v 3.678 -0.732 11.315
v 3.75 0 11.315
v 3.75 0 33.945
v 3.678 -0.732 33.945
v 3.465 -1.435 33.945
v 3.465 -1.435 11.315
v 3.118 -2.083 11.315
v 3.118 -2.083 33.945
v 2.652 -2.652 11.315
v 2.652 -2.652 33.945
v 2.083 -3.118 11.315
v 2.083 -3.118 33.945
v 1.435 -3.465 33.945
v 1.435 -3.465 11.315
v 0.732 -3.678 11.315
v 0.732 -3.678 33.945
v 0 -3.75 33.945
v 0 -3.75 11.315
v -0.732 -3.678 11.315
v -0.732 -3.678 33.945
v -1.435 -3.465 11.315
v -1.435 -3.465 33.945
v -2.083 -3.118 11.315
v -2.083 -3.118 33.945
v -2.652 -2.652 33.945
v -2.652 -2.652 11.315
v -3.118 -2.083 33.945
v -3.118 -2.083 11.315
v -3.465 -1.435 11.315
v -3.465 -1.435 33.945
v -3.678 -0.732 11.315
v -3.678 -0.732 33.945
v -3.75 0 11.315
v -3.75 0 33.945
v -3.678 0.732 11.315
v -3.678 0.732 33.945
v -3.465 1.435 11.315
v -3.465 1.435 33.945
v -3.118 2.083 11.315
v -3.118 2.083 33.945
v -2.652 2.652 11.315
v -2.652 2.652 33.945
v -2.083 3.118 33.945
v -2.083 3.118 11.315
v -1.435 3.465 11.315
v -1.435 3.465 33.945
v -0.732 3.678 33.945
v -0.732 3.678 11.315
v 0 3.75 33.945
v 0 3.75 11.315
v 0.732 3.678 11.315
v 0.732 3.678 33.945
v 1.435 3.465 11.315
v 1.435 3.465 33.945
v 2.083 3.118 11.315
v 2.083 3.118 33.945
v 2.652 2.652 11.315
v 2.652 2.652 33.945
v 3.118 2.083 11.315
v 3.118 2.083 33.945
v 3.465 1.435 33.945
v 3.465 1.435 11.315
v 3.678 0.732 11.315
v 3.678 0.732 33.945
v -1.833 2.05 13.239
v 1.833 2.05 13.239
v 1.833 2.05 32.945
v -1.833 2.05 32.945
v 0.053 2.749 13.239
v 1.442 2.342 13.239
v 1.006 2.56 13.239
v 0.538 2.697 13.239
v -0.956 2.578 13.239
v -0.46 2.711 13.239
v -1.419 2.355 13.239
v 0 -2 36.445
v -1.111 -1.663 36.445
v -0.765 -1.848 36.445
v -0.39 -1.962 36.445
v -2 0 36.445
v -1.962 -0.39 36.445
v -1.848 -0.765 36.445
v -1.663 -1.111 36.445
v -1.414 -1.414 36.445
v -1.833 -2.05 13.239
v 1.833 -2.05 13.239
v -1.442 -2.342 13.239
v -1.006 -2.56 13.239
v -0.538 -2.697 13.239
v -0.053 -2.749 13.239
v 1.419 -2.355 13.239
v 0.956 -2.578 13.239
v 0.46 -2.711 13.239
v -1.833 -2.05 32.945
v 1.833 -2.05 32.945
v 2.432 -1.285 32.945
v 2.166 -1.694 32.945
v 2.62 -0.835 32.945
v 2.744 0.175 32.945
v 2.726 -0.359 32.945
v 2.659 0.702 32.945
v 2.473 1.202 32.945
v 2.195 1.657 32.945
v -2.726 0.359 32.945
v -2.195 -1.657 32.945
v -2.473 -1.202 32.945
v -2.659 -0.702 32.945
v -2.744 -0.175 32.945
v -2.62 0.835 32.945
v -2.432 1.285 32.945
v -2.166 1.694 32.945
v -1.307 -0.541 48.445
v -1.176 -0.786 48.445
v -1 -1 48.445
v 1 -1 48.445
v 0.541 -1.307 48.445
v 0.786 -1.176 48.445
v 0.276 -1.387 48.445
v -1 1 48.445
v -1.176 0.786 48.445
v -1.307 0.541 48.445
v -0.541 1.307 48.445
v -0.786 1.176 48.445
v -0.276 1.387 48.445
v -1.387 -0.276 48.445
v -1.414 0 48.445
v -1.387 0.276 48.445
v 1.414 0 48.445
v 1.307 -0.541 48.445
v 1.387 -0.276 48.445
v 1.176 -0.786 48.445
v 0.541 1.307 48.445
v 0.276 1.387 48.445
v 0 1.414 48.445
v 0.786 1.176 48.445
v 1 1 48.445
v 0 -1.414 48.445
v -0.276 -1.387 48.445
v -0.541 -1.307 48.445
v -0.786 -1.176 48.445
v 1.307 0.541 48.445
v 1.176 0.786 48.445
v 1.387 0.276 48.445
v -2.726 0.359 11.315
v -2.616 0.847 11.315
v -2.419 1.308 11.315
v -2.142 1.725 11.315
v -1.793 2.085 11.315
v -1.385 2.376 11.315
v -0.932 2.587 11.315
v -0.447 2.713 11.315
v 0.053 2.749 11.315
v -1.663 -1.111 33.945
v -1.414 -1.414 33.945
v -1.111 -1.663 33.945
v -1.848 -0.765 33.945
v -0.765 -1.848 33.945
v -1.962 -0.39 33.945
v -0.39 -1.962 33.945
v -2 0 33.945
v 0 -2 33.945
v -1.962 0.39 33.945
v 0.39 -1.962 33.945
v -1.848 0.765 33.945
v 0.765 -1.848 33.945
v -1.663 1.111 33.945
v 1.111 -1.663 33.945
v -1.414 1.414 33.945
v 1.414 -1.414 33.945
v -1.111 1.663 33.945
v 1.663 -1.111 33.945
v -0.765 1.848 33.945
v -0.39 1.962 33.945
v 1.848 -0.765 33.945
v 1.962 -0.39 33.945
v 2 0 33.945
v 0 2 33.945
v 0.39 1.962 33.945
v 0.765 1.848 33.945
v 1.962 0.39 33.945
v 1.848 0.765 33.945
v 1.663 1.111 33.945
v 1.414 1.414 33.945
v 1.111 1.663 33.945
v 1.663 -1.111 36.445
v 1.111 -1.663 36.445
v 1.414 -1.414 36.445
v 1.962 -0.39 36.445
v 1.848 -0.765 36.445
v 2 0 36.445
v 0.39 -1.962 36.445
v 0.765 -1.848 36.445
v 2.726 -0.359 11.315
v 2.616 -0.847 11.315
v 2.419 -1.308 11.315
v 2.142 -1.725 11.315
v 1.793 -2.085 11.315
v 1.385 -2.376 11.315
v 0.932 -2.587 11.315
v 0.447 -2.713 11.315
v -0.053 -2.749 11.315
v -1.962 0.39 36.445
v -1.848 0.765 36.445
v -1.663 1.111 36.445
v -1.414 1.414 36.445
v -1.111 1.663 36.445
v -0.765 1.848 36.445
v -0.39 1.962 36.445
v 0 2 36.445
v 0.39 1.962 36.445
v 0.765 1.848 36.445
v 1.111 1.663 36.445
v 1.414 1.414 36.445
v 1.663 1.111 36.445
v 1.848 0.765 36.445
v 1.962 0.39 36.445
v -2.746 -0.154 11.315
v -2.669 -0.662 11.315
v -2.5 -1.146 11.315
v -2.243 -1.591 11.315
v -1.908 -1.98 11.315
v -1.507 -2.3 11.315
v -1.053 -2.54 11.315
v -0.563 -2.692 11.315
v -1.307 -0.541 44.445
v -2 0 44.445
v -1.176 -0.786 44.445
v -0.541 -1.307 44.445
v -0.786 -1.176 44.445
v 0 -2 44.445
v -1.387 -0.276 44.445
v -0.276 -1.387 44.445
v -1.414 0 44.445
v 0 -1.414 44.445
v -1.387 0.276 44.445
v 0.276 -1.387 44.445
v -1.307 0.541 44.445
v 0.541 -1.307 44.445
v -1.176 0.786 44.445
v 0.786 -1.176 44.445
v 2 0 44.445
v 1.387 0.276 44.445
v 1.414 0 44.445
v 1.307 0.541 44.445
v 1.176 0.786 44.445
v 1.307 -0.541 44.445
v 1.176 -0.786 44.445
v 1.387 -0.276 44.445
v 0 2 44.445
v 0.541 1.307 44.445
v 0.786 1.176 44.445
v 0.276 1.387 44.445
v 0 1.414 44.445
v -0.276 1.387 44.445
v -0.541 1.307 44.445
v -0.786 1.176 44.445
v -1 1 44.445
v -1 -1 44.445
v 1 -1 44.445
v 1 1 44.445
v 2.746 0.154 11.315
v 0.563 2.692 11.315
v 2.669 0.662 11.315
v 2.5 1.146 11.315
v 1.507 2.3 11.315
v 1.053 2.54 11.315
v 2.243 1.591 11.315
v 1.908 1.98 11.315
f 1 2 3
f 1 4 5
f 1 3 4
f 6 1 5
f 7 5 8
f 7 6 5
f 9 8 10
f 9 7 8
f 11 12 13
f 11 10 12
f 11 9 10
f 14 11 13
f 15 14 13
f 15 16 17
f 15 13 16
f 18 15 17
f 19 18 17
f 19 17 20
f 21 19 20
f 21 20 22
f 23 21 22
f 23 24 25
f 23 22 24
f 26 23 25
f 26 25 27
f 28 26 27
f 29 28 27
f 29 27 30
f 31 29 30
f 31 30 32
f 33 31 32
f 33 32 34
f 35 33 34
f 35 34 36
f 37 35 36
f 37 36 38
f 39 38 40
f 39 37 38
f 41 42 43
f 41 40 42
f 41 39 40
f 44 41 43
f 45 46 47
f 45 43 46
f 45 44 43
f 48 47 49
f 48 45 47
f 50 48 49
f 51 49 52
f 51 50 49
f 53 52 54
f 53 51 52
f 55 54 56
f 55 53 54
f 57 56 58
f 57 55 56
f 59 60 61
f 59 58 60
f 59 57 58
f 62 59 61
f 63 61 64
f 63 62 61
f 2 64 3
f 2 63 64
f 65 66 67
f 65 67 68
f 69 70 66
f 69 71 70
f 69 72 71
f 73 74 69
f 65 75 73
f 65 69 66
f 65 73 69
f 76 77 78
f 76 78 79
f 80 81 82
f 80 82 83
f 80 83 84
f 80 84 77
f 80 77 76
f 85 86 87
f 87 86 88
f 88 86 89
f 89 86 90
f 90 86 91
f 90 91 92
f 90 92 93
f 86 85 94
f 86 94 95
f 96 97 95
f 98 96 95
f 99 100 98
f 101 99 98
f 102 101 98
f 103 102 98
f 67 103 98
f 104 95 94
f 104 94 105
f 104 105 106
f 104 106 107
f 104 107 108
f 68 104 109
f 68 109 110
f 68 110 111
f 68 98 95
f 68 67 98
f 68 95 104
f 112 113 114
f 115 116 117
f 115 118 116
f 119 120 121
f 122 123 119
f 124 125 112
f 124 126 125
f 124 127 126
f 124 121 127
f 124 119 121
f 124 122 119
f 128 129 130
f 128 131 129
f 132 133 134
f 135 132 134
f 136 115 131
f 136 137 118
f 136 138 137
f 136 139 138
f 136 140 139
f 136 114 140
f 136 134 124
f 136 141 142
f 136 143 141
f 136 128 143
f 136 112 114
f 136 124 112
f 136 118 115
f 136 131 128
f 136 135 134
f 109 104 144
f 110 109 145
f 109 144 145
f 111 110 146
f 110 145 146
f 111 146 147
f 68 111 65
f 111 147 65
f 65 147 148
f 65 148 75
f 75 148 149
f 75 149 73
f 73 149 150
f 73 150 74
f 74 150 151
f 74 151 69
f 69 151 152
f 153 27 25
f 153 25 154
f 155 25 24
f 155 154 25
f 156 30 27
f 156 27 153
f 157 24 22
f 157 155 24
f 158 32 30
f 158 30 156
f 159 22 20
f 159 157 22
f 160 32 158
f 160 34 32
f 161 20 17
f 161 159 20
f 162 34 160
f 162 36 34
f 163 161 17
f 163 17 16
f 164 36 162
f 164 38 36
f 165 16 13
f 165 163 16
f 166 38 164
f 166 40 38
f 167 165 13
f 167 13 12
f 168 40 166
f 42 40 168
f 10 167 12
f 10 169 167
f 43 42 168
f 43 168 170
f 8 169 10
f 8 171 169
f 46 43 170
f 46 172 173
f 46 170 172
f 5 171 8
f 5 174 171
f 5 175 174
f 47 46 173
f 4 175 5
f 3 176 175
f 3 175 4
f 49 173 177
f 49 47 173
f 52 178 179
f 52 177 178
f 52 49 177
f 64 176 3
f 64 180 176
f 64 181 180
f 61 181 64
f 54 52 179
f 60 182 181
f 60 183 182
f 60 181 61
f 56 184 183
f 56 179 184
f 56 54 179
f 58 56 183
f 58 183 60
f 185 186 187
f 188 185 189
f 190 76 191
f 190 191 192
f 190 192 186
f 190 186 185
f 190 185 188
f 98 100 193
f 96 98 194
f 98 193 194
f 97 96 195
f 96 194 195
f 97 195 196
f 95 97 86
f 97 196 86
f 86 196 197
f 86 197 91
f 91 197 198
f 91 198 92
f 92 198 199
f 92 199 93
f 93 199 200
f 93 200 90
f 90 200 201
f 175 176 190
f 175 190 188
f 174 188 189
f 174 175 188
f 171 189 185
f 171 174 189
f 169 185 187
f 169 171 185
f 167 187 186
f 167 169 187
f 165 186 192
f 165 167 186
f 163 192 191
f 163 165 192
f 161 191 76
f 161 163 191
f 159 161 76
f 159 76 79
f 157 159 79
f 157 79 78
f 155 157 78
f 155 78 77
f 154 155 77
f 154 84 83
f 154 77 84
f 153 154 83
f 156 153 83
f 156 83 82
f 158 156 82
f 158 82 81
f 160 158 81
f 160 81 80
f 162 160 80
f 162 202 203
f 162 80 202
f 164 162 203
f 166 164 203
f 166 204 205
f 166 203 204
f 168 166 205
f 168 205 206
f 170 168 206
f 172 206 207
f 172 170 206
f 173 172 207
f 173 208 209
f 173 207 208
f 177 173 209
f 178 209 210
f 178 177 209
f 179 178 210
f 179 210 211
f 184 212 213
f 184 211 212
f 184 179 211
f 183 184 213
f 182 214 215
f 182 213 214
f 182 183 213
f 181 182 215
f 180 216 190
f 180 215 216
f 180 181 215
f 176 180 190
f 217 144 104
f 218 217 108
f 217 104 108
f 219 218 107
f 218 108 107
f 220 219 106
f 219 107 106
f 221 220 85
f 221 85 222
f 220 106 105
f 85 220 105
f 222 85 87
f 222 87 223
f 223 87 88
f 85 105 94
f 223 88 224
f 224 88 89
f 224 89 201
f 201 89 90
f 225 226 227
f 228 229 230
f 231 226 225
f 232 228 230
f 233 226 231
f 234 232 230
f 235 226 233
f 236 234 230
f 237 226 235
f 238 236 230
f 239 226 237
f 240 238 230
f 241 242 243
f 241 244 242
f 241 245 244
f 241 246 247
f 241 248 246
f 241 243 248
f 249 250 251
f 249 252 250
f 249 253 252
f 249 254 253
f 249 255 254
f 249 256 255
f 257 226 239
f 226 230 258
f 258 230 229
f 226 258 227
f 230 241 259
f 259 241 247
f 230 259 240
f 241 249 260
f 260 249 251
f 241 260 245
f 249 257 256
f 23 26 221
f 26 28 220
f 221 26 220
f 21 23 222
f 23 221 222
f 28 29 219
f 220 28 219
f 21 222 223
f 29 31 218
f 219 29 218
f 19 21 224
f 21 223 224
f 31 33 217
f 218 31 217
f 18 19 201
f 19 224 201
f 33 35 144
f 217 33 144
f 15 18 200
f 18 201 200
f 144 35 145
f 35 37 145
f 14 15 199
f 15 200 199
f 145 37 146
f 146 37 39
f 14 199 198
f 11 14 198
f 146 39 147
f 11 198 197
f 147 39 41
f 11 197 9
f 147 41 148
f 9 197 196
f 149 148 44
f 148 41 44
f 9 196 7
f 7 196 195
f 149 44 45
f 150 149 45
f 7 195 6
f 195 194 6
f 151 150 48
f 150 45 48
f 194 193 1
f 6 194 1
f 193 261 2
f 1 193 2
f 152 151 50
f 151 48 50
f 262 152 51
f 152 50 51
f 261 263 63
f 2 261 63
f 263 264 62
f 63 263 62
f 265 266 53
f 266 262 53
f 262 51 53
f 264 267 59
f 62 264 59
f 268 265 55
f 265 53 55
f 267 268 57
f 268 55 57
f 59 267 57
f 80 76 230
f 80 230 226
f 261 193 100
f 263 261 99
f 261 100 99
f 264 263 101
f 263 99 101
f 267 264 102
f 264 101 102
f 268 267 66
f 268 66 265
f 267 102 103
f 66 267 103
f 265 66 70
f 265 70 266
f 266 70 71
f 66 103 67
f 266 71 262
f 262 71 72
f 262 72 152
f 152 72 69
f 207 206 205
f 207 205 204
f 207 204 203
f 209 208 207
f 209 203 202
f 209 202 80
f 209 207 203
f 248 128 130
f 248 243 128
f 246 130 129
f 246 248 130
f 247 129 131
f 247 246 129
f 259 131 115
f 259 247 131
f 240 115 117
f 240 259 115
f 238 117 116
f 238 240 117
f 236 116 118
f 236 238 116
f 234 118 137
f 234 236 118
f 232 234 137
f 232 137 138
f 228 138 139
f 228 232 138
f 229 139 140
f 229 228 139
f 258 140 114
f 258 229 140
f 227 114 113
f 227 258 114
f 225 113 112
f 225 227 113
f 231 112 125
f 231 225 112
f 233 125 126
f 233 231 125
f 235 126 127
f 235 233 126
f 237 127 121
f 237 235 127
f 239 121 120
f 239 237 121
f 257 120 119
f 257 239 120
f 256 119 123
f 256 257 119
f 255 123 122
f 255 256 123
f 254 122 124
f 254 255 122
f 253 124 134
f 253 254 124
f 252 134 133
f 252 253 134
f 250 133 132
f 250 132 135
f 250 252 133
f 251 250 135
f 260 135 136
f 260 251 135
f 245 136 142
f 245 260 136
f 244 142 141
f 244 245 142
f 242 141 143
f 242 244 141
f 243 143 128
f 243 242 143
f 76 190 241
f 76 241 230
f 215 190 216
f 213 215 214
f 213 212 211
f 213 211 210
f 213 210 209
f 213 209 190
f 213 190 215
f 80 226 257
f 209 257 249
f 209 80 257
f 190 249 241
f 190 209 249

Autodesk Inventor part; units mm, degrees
ref_plane "YZ Plane" through (0, 0, 0) normal (1, 0, 0) x (0, 1, 0)
ref_plane "XZ Plane" through (0, 0, 0) normal (0, 1, 0) x (-1, 0, 0)
ref_plane "XY Plane" through (0, 0, 0) normal (0, 0, 1) x (1, 0, 0)
sketch "Sketch1" plane through (0, 0, 0) normal (0, 0, 1) x (1, 0, 0)
  circle A0 centre (0, 0) radius 4.8 projected
  arc A1 (-1.2481, -4.6349) -> (4.7694, 0.541) centre (0, 0) ccw projected
  circle A2 centre (0, 0) radius 9 projected
  circle A3 centre (0, 0) radius 4.8
  circle A4 centre (0, 0) radius 7.5
  circle A5 centre (0, 0) radius 5.5
  point P0 (0, 0)
  dimension "d0" = 15
  dimension "d23" = 11
extrude "Extrusion1" add sketch "Sketch1" along normal blind 9 contours A4
sketch "Sketch2" plane through (0, 0, 9) normal (0, 0, 1) x (1, 0, 0)
  line L0 (4.7694, 0.541) -> (-1.2481, -4.6349) projected
  line L1 (-4.7694, -0.541) -> (1.2481, 4.6349) projected
  circle A0 centre (0, 0) radius 7.5
  line L2 (-5.478, -0.491) -> (1.3046, 5.343)
  line L3 (-2.0867, 2.426) -> (-5.478, -0.491)
  line L4 (-1.3046, -5.343) -> (5.478, 0.491)
  line L5 (2.0867, -2.426) -> (-0.6256, -4.7591)
  arc A1 (-5.478, -0.491) -> (-1.3046, -5.343) centre (0, 0) ccw
  arc A2 (5.478, 0.491) -> (1.3046, 5.343) centre (0, 0) ccw
extrude "Extrusion2" add sketch "Sketch2" along normal blind 34.2598
sketch "Sketch3" plane through (0, 0, 43.2598) normal (0, 0, 1) x (1, 0, 0)
  circle A0 centre (0, 0) radius 7.5 projected
  circle A1 centre (0, 0) radius 7.5
  point P0 (0, 0)
extrude "Extrusion3" add sketch "Sketch3" along normal blind 2
sketch "Sketch5" plane through (0, 0, 45.2598) normal (0, 0, 1) x (1, 0, 0)
  circle A0 centre (0, 0) radius 4
  dimension "d10" = 8
extrude "Extrusion5" add sketch "Sketch5" along normal blind 5
sketch "Sketch6" plane through (0, 0, 50.2598) normal (0, 0, 1) x (1, 0, 0)
  circle A0 centre (0, 0) radius 4 projected
  line L0 (-4, 0) -> (0, 4)
  line L1 (0, 4) -> (4, 0)
  line L2 (4, 0) -> (0, -4)
  line L3 (0, -4) -> (-4, 0)
extrude "Extrusion6" add sketch "Sketch6" along normal blind 16 contours L2 L3 L0 L1
sketch "Sketch7" plane through (0, 0, 66.2598) normal (0, 0, 1) x (1, 0, 0)
  circle A0 centre (0, 0) radius 2.8284
  line L0 (0, 4) -> (-4, 0) projected
extrude "Extrusion7" add sketch "Sketch7" along normal blind 8
sketch "Sketch8" plane through (0, 0, 9) normal (0, 0, -1) x (-1, 0, 0)
  point P0 (0, 0)
sketch "Sketch9" plane through (0, 0, 43.2598) normal (0, 0, -1) x (-1, 0, 0)
  line L0 (1.0362, -6.2993) -> (-6.5532, 0.2287)
  line L1 (6.1416, 0.1254) -> (-2.464, 7.5275)
  arc A0 (0.1057, -5.499) -> (5.453, 0.7177) centre (0, 0) ccw
  arc A1 (-0.1057, 5.499) -> (-5.453, -0.7177) centre (0, 0) ccw
  point P0 (0, 0)
  point P1 (0, 0)
extrude "Extrusion8" cut sketch "Sketch9" along normal blind 50
sketch "Sketch10" plane through (0, 0, 43.2598) normal (0, 0, -1) x (-1, 0, 0)
  circle A0 centre (0, 0) radius 5.5
  dimension "d28" = 11
extrude "Extrusion9" cut sketch "Sketch10" along normal blind 50
sketch "Sketch11" plane through (0, 0, 43.2598) normal (0, 0, -1) x (-1, 0, 0)
  line L0 (-4.1828, 4.1) -> (4.1828, 4.1)
  line L1 (4.1828, -4.1) -> (-4.1828, -4.1)
  line L2 (-12.4976, 4.1) -> (12.4976, -4.1) construction
  line L3 (12.4976, 4.1) -> (-12.4976, -4.1) construction
  arc A0 (4.1828, 4.1) -> (-4.1828, 4.1) centre (0, 0) ccw
  arc A1 (-4.1828, -4.1) -> (4.1828, -4.1) centre (0, 0) ccw
  point P0 (0, 0)
  dimension "d34" = 8.2
extrude "Extrusion10" add sketch "Sketch11" along normal blind 39.4125
scale "Scale1" factors (0.5, 0.5, 0.5) then translate (0, 0, 11.3149) bodies 1
properties part number "MainGearShaft"
